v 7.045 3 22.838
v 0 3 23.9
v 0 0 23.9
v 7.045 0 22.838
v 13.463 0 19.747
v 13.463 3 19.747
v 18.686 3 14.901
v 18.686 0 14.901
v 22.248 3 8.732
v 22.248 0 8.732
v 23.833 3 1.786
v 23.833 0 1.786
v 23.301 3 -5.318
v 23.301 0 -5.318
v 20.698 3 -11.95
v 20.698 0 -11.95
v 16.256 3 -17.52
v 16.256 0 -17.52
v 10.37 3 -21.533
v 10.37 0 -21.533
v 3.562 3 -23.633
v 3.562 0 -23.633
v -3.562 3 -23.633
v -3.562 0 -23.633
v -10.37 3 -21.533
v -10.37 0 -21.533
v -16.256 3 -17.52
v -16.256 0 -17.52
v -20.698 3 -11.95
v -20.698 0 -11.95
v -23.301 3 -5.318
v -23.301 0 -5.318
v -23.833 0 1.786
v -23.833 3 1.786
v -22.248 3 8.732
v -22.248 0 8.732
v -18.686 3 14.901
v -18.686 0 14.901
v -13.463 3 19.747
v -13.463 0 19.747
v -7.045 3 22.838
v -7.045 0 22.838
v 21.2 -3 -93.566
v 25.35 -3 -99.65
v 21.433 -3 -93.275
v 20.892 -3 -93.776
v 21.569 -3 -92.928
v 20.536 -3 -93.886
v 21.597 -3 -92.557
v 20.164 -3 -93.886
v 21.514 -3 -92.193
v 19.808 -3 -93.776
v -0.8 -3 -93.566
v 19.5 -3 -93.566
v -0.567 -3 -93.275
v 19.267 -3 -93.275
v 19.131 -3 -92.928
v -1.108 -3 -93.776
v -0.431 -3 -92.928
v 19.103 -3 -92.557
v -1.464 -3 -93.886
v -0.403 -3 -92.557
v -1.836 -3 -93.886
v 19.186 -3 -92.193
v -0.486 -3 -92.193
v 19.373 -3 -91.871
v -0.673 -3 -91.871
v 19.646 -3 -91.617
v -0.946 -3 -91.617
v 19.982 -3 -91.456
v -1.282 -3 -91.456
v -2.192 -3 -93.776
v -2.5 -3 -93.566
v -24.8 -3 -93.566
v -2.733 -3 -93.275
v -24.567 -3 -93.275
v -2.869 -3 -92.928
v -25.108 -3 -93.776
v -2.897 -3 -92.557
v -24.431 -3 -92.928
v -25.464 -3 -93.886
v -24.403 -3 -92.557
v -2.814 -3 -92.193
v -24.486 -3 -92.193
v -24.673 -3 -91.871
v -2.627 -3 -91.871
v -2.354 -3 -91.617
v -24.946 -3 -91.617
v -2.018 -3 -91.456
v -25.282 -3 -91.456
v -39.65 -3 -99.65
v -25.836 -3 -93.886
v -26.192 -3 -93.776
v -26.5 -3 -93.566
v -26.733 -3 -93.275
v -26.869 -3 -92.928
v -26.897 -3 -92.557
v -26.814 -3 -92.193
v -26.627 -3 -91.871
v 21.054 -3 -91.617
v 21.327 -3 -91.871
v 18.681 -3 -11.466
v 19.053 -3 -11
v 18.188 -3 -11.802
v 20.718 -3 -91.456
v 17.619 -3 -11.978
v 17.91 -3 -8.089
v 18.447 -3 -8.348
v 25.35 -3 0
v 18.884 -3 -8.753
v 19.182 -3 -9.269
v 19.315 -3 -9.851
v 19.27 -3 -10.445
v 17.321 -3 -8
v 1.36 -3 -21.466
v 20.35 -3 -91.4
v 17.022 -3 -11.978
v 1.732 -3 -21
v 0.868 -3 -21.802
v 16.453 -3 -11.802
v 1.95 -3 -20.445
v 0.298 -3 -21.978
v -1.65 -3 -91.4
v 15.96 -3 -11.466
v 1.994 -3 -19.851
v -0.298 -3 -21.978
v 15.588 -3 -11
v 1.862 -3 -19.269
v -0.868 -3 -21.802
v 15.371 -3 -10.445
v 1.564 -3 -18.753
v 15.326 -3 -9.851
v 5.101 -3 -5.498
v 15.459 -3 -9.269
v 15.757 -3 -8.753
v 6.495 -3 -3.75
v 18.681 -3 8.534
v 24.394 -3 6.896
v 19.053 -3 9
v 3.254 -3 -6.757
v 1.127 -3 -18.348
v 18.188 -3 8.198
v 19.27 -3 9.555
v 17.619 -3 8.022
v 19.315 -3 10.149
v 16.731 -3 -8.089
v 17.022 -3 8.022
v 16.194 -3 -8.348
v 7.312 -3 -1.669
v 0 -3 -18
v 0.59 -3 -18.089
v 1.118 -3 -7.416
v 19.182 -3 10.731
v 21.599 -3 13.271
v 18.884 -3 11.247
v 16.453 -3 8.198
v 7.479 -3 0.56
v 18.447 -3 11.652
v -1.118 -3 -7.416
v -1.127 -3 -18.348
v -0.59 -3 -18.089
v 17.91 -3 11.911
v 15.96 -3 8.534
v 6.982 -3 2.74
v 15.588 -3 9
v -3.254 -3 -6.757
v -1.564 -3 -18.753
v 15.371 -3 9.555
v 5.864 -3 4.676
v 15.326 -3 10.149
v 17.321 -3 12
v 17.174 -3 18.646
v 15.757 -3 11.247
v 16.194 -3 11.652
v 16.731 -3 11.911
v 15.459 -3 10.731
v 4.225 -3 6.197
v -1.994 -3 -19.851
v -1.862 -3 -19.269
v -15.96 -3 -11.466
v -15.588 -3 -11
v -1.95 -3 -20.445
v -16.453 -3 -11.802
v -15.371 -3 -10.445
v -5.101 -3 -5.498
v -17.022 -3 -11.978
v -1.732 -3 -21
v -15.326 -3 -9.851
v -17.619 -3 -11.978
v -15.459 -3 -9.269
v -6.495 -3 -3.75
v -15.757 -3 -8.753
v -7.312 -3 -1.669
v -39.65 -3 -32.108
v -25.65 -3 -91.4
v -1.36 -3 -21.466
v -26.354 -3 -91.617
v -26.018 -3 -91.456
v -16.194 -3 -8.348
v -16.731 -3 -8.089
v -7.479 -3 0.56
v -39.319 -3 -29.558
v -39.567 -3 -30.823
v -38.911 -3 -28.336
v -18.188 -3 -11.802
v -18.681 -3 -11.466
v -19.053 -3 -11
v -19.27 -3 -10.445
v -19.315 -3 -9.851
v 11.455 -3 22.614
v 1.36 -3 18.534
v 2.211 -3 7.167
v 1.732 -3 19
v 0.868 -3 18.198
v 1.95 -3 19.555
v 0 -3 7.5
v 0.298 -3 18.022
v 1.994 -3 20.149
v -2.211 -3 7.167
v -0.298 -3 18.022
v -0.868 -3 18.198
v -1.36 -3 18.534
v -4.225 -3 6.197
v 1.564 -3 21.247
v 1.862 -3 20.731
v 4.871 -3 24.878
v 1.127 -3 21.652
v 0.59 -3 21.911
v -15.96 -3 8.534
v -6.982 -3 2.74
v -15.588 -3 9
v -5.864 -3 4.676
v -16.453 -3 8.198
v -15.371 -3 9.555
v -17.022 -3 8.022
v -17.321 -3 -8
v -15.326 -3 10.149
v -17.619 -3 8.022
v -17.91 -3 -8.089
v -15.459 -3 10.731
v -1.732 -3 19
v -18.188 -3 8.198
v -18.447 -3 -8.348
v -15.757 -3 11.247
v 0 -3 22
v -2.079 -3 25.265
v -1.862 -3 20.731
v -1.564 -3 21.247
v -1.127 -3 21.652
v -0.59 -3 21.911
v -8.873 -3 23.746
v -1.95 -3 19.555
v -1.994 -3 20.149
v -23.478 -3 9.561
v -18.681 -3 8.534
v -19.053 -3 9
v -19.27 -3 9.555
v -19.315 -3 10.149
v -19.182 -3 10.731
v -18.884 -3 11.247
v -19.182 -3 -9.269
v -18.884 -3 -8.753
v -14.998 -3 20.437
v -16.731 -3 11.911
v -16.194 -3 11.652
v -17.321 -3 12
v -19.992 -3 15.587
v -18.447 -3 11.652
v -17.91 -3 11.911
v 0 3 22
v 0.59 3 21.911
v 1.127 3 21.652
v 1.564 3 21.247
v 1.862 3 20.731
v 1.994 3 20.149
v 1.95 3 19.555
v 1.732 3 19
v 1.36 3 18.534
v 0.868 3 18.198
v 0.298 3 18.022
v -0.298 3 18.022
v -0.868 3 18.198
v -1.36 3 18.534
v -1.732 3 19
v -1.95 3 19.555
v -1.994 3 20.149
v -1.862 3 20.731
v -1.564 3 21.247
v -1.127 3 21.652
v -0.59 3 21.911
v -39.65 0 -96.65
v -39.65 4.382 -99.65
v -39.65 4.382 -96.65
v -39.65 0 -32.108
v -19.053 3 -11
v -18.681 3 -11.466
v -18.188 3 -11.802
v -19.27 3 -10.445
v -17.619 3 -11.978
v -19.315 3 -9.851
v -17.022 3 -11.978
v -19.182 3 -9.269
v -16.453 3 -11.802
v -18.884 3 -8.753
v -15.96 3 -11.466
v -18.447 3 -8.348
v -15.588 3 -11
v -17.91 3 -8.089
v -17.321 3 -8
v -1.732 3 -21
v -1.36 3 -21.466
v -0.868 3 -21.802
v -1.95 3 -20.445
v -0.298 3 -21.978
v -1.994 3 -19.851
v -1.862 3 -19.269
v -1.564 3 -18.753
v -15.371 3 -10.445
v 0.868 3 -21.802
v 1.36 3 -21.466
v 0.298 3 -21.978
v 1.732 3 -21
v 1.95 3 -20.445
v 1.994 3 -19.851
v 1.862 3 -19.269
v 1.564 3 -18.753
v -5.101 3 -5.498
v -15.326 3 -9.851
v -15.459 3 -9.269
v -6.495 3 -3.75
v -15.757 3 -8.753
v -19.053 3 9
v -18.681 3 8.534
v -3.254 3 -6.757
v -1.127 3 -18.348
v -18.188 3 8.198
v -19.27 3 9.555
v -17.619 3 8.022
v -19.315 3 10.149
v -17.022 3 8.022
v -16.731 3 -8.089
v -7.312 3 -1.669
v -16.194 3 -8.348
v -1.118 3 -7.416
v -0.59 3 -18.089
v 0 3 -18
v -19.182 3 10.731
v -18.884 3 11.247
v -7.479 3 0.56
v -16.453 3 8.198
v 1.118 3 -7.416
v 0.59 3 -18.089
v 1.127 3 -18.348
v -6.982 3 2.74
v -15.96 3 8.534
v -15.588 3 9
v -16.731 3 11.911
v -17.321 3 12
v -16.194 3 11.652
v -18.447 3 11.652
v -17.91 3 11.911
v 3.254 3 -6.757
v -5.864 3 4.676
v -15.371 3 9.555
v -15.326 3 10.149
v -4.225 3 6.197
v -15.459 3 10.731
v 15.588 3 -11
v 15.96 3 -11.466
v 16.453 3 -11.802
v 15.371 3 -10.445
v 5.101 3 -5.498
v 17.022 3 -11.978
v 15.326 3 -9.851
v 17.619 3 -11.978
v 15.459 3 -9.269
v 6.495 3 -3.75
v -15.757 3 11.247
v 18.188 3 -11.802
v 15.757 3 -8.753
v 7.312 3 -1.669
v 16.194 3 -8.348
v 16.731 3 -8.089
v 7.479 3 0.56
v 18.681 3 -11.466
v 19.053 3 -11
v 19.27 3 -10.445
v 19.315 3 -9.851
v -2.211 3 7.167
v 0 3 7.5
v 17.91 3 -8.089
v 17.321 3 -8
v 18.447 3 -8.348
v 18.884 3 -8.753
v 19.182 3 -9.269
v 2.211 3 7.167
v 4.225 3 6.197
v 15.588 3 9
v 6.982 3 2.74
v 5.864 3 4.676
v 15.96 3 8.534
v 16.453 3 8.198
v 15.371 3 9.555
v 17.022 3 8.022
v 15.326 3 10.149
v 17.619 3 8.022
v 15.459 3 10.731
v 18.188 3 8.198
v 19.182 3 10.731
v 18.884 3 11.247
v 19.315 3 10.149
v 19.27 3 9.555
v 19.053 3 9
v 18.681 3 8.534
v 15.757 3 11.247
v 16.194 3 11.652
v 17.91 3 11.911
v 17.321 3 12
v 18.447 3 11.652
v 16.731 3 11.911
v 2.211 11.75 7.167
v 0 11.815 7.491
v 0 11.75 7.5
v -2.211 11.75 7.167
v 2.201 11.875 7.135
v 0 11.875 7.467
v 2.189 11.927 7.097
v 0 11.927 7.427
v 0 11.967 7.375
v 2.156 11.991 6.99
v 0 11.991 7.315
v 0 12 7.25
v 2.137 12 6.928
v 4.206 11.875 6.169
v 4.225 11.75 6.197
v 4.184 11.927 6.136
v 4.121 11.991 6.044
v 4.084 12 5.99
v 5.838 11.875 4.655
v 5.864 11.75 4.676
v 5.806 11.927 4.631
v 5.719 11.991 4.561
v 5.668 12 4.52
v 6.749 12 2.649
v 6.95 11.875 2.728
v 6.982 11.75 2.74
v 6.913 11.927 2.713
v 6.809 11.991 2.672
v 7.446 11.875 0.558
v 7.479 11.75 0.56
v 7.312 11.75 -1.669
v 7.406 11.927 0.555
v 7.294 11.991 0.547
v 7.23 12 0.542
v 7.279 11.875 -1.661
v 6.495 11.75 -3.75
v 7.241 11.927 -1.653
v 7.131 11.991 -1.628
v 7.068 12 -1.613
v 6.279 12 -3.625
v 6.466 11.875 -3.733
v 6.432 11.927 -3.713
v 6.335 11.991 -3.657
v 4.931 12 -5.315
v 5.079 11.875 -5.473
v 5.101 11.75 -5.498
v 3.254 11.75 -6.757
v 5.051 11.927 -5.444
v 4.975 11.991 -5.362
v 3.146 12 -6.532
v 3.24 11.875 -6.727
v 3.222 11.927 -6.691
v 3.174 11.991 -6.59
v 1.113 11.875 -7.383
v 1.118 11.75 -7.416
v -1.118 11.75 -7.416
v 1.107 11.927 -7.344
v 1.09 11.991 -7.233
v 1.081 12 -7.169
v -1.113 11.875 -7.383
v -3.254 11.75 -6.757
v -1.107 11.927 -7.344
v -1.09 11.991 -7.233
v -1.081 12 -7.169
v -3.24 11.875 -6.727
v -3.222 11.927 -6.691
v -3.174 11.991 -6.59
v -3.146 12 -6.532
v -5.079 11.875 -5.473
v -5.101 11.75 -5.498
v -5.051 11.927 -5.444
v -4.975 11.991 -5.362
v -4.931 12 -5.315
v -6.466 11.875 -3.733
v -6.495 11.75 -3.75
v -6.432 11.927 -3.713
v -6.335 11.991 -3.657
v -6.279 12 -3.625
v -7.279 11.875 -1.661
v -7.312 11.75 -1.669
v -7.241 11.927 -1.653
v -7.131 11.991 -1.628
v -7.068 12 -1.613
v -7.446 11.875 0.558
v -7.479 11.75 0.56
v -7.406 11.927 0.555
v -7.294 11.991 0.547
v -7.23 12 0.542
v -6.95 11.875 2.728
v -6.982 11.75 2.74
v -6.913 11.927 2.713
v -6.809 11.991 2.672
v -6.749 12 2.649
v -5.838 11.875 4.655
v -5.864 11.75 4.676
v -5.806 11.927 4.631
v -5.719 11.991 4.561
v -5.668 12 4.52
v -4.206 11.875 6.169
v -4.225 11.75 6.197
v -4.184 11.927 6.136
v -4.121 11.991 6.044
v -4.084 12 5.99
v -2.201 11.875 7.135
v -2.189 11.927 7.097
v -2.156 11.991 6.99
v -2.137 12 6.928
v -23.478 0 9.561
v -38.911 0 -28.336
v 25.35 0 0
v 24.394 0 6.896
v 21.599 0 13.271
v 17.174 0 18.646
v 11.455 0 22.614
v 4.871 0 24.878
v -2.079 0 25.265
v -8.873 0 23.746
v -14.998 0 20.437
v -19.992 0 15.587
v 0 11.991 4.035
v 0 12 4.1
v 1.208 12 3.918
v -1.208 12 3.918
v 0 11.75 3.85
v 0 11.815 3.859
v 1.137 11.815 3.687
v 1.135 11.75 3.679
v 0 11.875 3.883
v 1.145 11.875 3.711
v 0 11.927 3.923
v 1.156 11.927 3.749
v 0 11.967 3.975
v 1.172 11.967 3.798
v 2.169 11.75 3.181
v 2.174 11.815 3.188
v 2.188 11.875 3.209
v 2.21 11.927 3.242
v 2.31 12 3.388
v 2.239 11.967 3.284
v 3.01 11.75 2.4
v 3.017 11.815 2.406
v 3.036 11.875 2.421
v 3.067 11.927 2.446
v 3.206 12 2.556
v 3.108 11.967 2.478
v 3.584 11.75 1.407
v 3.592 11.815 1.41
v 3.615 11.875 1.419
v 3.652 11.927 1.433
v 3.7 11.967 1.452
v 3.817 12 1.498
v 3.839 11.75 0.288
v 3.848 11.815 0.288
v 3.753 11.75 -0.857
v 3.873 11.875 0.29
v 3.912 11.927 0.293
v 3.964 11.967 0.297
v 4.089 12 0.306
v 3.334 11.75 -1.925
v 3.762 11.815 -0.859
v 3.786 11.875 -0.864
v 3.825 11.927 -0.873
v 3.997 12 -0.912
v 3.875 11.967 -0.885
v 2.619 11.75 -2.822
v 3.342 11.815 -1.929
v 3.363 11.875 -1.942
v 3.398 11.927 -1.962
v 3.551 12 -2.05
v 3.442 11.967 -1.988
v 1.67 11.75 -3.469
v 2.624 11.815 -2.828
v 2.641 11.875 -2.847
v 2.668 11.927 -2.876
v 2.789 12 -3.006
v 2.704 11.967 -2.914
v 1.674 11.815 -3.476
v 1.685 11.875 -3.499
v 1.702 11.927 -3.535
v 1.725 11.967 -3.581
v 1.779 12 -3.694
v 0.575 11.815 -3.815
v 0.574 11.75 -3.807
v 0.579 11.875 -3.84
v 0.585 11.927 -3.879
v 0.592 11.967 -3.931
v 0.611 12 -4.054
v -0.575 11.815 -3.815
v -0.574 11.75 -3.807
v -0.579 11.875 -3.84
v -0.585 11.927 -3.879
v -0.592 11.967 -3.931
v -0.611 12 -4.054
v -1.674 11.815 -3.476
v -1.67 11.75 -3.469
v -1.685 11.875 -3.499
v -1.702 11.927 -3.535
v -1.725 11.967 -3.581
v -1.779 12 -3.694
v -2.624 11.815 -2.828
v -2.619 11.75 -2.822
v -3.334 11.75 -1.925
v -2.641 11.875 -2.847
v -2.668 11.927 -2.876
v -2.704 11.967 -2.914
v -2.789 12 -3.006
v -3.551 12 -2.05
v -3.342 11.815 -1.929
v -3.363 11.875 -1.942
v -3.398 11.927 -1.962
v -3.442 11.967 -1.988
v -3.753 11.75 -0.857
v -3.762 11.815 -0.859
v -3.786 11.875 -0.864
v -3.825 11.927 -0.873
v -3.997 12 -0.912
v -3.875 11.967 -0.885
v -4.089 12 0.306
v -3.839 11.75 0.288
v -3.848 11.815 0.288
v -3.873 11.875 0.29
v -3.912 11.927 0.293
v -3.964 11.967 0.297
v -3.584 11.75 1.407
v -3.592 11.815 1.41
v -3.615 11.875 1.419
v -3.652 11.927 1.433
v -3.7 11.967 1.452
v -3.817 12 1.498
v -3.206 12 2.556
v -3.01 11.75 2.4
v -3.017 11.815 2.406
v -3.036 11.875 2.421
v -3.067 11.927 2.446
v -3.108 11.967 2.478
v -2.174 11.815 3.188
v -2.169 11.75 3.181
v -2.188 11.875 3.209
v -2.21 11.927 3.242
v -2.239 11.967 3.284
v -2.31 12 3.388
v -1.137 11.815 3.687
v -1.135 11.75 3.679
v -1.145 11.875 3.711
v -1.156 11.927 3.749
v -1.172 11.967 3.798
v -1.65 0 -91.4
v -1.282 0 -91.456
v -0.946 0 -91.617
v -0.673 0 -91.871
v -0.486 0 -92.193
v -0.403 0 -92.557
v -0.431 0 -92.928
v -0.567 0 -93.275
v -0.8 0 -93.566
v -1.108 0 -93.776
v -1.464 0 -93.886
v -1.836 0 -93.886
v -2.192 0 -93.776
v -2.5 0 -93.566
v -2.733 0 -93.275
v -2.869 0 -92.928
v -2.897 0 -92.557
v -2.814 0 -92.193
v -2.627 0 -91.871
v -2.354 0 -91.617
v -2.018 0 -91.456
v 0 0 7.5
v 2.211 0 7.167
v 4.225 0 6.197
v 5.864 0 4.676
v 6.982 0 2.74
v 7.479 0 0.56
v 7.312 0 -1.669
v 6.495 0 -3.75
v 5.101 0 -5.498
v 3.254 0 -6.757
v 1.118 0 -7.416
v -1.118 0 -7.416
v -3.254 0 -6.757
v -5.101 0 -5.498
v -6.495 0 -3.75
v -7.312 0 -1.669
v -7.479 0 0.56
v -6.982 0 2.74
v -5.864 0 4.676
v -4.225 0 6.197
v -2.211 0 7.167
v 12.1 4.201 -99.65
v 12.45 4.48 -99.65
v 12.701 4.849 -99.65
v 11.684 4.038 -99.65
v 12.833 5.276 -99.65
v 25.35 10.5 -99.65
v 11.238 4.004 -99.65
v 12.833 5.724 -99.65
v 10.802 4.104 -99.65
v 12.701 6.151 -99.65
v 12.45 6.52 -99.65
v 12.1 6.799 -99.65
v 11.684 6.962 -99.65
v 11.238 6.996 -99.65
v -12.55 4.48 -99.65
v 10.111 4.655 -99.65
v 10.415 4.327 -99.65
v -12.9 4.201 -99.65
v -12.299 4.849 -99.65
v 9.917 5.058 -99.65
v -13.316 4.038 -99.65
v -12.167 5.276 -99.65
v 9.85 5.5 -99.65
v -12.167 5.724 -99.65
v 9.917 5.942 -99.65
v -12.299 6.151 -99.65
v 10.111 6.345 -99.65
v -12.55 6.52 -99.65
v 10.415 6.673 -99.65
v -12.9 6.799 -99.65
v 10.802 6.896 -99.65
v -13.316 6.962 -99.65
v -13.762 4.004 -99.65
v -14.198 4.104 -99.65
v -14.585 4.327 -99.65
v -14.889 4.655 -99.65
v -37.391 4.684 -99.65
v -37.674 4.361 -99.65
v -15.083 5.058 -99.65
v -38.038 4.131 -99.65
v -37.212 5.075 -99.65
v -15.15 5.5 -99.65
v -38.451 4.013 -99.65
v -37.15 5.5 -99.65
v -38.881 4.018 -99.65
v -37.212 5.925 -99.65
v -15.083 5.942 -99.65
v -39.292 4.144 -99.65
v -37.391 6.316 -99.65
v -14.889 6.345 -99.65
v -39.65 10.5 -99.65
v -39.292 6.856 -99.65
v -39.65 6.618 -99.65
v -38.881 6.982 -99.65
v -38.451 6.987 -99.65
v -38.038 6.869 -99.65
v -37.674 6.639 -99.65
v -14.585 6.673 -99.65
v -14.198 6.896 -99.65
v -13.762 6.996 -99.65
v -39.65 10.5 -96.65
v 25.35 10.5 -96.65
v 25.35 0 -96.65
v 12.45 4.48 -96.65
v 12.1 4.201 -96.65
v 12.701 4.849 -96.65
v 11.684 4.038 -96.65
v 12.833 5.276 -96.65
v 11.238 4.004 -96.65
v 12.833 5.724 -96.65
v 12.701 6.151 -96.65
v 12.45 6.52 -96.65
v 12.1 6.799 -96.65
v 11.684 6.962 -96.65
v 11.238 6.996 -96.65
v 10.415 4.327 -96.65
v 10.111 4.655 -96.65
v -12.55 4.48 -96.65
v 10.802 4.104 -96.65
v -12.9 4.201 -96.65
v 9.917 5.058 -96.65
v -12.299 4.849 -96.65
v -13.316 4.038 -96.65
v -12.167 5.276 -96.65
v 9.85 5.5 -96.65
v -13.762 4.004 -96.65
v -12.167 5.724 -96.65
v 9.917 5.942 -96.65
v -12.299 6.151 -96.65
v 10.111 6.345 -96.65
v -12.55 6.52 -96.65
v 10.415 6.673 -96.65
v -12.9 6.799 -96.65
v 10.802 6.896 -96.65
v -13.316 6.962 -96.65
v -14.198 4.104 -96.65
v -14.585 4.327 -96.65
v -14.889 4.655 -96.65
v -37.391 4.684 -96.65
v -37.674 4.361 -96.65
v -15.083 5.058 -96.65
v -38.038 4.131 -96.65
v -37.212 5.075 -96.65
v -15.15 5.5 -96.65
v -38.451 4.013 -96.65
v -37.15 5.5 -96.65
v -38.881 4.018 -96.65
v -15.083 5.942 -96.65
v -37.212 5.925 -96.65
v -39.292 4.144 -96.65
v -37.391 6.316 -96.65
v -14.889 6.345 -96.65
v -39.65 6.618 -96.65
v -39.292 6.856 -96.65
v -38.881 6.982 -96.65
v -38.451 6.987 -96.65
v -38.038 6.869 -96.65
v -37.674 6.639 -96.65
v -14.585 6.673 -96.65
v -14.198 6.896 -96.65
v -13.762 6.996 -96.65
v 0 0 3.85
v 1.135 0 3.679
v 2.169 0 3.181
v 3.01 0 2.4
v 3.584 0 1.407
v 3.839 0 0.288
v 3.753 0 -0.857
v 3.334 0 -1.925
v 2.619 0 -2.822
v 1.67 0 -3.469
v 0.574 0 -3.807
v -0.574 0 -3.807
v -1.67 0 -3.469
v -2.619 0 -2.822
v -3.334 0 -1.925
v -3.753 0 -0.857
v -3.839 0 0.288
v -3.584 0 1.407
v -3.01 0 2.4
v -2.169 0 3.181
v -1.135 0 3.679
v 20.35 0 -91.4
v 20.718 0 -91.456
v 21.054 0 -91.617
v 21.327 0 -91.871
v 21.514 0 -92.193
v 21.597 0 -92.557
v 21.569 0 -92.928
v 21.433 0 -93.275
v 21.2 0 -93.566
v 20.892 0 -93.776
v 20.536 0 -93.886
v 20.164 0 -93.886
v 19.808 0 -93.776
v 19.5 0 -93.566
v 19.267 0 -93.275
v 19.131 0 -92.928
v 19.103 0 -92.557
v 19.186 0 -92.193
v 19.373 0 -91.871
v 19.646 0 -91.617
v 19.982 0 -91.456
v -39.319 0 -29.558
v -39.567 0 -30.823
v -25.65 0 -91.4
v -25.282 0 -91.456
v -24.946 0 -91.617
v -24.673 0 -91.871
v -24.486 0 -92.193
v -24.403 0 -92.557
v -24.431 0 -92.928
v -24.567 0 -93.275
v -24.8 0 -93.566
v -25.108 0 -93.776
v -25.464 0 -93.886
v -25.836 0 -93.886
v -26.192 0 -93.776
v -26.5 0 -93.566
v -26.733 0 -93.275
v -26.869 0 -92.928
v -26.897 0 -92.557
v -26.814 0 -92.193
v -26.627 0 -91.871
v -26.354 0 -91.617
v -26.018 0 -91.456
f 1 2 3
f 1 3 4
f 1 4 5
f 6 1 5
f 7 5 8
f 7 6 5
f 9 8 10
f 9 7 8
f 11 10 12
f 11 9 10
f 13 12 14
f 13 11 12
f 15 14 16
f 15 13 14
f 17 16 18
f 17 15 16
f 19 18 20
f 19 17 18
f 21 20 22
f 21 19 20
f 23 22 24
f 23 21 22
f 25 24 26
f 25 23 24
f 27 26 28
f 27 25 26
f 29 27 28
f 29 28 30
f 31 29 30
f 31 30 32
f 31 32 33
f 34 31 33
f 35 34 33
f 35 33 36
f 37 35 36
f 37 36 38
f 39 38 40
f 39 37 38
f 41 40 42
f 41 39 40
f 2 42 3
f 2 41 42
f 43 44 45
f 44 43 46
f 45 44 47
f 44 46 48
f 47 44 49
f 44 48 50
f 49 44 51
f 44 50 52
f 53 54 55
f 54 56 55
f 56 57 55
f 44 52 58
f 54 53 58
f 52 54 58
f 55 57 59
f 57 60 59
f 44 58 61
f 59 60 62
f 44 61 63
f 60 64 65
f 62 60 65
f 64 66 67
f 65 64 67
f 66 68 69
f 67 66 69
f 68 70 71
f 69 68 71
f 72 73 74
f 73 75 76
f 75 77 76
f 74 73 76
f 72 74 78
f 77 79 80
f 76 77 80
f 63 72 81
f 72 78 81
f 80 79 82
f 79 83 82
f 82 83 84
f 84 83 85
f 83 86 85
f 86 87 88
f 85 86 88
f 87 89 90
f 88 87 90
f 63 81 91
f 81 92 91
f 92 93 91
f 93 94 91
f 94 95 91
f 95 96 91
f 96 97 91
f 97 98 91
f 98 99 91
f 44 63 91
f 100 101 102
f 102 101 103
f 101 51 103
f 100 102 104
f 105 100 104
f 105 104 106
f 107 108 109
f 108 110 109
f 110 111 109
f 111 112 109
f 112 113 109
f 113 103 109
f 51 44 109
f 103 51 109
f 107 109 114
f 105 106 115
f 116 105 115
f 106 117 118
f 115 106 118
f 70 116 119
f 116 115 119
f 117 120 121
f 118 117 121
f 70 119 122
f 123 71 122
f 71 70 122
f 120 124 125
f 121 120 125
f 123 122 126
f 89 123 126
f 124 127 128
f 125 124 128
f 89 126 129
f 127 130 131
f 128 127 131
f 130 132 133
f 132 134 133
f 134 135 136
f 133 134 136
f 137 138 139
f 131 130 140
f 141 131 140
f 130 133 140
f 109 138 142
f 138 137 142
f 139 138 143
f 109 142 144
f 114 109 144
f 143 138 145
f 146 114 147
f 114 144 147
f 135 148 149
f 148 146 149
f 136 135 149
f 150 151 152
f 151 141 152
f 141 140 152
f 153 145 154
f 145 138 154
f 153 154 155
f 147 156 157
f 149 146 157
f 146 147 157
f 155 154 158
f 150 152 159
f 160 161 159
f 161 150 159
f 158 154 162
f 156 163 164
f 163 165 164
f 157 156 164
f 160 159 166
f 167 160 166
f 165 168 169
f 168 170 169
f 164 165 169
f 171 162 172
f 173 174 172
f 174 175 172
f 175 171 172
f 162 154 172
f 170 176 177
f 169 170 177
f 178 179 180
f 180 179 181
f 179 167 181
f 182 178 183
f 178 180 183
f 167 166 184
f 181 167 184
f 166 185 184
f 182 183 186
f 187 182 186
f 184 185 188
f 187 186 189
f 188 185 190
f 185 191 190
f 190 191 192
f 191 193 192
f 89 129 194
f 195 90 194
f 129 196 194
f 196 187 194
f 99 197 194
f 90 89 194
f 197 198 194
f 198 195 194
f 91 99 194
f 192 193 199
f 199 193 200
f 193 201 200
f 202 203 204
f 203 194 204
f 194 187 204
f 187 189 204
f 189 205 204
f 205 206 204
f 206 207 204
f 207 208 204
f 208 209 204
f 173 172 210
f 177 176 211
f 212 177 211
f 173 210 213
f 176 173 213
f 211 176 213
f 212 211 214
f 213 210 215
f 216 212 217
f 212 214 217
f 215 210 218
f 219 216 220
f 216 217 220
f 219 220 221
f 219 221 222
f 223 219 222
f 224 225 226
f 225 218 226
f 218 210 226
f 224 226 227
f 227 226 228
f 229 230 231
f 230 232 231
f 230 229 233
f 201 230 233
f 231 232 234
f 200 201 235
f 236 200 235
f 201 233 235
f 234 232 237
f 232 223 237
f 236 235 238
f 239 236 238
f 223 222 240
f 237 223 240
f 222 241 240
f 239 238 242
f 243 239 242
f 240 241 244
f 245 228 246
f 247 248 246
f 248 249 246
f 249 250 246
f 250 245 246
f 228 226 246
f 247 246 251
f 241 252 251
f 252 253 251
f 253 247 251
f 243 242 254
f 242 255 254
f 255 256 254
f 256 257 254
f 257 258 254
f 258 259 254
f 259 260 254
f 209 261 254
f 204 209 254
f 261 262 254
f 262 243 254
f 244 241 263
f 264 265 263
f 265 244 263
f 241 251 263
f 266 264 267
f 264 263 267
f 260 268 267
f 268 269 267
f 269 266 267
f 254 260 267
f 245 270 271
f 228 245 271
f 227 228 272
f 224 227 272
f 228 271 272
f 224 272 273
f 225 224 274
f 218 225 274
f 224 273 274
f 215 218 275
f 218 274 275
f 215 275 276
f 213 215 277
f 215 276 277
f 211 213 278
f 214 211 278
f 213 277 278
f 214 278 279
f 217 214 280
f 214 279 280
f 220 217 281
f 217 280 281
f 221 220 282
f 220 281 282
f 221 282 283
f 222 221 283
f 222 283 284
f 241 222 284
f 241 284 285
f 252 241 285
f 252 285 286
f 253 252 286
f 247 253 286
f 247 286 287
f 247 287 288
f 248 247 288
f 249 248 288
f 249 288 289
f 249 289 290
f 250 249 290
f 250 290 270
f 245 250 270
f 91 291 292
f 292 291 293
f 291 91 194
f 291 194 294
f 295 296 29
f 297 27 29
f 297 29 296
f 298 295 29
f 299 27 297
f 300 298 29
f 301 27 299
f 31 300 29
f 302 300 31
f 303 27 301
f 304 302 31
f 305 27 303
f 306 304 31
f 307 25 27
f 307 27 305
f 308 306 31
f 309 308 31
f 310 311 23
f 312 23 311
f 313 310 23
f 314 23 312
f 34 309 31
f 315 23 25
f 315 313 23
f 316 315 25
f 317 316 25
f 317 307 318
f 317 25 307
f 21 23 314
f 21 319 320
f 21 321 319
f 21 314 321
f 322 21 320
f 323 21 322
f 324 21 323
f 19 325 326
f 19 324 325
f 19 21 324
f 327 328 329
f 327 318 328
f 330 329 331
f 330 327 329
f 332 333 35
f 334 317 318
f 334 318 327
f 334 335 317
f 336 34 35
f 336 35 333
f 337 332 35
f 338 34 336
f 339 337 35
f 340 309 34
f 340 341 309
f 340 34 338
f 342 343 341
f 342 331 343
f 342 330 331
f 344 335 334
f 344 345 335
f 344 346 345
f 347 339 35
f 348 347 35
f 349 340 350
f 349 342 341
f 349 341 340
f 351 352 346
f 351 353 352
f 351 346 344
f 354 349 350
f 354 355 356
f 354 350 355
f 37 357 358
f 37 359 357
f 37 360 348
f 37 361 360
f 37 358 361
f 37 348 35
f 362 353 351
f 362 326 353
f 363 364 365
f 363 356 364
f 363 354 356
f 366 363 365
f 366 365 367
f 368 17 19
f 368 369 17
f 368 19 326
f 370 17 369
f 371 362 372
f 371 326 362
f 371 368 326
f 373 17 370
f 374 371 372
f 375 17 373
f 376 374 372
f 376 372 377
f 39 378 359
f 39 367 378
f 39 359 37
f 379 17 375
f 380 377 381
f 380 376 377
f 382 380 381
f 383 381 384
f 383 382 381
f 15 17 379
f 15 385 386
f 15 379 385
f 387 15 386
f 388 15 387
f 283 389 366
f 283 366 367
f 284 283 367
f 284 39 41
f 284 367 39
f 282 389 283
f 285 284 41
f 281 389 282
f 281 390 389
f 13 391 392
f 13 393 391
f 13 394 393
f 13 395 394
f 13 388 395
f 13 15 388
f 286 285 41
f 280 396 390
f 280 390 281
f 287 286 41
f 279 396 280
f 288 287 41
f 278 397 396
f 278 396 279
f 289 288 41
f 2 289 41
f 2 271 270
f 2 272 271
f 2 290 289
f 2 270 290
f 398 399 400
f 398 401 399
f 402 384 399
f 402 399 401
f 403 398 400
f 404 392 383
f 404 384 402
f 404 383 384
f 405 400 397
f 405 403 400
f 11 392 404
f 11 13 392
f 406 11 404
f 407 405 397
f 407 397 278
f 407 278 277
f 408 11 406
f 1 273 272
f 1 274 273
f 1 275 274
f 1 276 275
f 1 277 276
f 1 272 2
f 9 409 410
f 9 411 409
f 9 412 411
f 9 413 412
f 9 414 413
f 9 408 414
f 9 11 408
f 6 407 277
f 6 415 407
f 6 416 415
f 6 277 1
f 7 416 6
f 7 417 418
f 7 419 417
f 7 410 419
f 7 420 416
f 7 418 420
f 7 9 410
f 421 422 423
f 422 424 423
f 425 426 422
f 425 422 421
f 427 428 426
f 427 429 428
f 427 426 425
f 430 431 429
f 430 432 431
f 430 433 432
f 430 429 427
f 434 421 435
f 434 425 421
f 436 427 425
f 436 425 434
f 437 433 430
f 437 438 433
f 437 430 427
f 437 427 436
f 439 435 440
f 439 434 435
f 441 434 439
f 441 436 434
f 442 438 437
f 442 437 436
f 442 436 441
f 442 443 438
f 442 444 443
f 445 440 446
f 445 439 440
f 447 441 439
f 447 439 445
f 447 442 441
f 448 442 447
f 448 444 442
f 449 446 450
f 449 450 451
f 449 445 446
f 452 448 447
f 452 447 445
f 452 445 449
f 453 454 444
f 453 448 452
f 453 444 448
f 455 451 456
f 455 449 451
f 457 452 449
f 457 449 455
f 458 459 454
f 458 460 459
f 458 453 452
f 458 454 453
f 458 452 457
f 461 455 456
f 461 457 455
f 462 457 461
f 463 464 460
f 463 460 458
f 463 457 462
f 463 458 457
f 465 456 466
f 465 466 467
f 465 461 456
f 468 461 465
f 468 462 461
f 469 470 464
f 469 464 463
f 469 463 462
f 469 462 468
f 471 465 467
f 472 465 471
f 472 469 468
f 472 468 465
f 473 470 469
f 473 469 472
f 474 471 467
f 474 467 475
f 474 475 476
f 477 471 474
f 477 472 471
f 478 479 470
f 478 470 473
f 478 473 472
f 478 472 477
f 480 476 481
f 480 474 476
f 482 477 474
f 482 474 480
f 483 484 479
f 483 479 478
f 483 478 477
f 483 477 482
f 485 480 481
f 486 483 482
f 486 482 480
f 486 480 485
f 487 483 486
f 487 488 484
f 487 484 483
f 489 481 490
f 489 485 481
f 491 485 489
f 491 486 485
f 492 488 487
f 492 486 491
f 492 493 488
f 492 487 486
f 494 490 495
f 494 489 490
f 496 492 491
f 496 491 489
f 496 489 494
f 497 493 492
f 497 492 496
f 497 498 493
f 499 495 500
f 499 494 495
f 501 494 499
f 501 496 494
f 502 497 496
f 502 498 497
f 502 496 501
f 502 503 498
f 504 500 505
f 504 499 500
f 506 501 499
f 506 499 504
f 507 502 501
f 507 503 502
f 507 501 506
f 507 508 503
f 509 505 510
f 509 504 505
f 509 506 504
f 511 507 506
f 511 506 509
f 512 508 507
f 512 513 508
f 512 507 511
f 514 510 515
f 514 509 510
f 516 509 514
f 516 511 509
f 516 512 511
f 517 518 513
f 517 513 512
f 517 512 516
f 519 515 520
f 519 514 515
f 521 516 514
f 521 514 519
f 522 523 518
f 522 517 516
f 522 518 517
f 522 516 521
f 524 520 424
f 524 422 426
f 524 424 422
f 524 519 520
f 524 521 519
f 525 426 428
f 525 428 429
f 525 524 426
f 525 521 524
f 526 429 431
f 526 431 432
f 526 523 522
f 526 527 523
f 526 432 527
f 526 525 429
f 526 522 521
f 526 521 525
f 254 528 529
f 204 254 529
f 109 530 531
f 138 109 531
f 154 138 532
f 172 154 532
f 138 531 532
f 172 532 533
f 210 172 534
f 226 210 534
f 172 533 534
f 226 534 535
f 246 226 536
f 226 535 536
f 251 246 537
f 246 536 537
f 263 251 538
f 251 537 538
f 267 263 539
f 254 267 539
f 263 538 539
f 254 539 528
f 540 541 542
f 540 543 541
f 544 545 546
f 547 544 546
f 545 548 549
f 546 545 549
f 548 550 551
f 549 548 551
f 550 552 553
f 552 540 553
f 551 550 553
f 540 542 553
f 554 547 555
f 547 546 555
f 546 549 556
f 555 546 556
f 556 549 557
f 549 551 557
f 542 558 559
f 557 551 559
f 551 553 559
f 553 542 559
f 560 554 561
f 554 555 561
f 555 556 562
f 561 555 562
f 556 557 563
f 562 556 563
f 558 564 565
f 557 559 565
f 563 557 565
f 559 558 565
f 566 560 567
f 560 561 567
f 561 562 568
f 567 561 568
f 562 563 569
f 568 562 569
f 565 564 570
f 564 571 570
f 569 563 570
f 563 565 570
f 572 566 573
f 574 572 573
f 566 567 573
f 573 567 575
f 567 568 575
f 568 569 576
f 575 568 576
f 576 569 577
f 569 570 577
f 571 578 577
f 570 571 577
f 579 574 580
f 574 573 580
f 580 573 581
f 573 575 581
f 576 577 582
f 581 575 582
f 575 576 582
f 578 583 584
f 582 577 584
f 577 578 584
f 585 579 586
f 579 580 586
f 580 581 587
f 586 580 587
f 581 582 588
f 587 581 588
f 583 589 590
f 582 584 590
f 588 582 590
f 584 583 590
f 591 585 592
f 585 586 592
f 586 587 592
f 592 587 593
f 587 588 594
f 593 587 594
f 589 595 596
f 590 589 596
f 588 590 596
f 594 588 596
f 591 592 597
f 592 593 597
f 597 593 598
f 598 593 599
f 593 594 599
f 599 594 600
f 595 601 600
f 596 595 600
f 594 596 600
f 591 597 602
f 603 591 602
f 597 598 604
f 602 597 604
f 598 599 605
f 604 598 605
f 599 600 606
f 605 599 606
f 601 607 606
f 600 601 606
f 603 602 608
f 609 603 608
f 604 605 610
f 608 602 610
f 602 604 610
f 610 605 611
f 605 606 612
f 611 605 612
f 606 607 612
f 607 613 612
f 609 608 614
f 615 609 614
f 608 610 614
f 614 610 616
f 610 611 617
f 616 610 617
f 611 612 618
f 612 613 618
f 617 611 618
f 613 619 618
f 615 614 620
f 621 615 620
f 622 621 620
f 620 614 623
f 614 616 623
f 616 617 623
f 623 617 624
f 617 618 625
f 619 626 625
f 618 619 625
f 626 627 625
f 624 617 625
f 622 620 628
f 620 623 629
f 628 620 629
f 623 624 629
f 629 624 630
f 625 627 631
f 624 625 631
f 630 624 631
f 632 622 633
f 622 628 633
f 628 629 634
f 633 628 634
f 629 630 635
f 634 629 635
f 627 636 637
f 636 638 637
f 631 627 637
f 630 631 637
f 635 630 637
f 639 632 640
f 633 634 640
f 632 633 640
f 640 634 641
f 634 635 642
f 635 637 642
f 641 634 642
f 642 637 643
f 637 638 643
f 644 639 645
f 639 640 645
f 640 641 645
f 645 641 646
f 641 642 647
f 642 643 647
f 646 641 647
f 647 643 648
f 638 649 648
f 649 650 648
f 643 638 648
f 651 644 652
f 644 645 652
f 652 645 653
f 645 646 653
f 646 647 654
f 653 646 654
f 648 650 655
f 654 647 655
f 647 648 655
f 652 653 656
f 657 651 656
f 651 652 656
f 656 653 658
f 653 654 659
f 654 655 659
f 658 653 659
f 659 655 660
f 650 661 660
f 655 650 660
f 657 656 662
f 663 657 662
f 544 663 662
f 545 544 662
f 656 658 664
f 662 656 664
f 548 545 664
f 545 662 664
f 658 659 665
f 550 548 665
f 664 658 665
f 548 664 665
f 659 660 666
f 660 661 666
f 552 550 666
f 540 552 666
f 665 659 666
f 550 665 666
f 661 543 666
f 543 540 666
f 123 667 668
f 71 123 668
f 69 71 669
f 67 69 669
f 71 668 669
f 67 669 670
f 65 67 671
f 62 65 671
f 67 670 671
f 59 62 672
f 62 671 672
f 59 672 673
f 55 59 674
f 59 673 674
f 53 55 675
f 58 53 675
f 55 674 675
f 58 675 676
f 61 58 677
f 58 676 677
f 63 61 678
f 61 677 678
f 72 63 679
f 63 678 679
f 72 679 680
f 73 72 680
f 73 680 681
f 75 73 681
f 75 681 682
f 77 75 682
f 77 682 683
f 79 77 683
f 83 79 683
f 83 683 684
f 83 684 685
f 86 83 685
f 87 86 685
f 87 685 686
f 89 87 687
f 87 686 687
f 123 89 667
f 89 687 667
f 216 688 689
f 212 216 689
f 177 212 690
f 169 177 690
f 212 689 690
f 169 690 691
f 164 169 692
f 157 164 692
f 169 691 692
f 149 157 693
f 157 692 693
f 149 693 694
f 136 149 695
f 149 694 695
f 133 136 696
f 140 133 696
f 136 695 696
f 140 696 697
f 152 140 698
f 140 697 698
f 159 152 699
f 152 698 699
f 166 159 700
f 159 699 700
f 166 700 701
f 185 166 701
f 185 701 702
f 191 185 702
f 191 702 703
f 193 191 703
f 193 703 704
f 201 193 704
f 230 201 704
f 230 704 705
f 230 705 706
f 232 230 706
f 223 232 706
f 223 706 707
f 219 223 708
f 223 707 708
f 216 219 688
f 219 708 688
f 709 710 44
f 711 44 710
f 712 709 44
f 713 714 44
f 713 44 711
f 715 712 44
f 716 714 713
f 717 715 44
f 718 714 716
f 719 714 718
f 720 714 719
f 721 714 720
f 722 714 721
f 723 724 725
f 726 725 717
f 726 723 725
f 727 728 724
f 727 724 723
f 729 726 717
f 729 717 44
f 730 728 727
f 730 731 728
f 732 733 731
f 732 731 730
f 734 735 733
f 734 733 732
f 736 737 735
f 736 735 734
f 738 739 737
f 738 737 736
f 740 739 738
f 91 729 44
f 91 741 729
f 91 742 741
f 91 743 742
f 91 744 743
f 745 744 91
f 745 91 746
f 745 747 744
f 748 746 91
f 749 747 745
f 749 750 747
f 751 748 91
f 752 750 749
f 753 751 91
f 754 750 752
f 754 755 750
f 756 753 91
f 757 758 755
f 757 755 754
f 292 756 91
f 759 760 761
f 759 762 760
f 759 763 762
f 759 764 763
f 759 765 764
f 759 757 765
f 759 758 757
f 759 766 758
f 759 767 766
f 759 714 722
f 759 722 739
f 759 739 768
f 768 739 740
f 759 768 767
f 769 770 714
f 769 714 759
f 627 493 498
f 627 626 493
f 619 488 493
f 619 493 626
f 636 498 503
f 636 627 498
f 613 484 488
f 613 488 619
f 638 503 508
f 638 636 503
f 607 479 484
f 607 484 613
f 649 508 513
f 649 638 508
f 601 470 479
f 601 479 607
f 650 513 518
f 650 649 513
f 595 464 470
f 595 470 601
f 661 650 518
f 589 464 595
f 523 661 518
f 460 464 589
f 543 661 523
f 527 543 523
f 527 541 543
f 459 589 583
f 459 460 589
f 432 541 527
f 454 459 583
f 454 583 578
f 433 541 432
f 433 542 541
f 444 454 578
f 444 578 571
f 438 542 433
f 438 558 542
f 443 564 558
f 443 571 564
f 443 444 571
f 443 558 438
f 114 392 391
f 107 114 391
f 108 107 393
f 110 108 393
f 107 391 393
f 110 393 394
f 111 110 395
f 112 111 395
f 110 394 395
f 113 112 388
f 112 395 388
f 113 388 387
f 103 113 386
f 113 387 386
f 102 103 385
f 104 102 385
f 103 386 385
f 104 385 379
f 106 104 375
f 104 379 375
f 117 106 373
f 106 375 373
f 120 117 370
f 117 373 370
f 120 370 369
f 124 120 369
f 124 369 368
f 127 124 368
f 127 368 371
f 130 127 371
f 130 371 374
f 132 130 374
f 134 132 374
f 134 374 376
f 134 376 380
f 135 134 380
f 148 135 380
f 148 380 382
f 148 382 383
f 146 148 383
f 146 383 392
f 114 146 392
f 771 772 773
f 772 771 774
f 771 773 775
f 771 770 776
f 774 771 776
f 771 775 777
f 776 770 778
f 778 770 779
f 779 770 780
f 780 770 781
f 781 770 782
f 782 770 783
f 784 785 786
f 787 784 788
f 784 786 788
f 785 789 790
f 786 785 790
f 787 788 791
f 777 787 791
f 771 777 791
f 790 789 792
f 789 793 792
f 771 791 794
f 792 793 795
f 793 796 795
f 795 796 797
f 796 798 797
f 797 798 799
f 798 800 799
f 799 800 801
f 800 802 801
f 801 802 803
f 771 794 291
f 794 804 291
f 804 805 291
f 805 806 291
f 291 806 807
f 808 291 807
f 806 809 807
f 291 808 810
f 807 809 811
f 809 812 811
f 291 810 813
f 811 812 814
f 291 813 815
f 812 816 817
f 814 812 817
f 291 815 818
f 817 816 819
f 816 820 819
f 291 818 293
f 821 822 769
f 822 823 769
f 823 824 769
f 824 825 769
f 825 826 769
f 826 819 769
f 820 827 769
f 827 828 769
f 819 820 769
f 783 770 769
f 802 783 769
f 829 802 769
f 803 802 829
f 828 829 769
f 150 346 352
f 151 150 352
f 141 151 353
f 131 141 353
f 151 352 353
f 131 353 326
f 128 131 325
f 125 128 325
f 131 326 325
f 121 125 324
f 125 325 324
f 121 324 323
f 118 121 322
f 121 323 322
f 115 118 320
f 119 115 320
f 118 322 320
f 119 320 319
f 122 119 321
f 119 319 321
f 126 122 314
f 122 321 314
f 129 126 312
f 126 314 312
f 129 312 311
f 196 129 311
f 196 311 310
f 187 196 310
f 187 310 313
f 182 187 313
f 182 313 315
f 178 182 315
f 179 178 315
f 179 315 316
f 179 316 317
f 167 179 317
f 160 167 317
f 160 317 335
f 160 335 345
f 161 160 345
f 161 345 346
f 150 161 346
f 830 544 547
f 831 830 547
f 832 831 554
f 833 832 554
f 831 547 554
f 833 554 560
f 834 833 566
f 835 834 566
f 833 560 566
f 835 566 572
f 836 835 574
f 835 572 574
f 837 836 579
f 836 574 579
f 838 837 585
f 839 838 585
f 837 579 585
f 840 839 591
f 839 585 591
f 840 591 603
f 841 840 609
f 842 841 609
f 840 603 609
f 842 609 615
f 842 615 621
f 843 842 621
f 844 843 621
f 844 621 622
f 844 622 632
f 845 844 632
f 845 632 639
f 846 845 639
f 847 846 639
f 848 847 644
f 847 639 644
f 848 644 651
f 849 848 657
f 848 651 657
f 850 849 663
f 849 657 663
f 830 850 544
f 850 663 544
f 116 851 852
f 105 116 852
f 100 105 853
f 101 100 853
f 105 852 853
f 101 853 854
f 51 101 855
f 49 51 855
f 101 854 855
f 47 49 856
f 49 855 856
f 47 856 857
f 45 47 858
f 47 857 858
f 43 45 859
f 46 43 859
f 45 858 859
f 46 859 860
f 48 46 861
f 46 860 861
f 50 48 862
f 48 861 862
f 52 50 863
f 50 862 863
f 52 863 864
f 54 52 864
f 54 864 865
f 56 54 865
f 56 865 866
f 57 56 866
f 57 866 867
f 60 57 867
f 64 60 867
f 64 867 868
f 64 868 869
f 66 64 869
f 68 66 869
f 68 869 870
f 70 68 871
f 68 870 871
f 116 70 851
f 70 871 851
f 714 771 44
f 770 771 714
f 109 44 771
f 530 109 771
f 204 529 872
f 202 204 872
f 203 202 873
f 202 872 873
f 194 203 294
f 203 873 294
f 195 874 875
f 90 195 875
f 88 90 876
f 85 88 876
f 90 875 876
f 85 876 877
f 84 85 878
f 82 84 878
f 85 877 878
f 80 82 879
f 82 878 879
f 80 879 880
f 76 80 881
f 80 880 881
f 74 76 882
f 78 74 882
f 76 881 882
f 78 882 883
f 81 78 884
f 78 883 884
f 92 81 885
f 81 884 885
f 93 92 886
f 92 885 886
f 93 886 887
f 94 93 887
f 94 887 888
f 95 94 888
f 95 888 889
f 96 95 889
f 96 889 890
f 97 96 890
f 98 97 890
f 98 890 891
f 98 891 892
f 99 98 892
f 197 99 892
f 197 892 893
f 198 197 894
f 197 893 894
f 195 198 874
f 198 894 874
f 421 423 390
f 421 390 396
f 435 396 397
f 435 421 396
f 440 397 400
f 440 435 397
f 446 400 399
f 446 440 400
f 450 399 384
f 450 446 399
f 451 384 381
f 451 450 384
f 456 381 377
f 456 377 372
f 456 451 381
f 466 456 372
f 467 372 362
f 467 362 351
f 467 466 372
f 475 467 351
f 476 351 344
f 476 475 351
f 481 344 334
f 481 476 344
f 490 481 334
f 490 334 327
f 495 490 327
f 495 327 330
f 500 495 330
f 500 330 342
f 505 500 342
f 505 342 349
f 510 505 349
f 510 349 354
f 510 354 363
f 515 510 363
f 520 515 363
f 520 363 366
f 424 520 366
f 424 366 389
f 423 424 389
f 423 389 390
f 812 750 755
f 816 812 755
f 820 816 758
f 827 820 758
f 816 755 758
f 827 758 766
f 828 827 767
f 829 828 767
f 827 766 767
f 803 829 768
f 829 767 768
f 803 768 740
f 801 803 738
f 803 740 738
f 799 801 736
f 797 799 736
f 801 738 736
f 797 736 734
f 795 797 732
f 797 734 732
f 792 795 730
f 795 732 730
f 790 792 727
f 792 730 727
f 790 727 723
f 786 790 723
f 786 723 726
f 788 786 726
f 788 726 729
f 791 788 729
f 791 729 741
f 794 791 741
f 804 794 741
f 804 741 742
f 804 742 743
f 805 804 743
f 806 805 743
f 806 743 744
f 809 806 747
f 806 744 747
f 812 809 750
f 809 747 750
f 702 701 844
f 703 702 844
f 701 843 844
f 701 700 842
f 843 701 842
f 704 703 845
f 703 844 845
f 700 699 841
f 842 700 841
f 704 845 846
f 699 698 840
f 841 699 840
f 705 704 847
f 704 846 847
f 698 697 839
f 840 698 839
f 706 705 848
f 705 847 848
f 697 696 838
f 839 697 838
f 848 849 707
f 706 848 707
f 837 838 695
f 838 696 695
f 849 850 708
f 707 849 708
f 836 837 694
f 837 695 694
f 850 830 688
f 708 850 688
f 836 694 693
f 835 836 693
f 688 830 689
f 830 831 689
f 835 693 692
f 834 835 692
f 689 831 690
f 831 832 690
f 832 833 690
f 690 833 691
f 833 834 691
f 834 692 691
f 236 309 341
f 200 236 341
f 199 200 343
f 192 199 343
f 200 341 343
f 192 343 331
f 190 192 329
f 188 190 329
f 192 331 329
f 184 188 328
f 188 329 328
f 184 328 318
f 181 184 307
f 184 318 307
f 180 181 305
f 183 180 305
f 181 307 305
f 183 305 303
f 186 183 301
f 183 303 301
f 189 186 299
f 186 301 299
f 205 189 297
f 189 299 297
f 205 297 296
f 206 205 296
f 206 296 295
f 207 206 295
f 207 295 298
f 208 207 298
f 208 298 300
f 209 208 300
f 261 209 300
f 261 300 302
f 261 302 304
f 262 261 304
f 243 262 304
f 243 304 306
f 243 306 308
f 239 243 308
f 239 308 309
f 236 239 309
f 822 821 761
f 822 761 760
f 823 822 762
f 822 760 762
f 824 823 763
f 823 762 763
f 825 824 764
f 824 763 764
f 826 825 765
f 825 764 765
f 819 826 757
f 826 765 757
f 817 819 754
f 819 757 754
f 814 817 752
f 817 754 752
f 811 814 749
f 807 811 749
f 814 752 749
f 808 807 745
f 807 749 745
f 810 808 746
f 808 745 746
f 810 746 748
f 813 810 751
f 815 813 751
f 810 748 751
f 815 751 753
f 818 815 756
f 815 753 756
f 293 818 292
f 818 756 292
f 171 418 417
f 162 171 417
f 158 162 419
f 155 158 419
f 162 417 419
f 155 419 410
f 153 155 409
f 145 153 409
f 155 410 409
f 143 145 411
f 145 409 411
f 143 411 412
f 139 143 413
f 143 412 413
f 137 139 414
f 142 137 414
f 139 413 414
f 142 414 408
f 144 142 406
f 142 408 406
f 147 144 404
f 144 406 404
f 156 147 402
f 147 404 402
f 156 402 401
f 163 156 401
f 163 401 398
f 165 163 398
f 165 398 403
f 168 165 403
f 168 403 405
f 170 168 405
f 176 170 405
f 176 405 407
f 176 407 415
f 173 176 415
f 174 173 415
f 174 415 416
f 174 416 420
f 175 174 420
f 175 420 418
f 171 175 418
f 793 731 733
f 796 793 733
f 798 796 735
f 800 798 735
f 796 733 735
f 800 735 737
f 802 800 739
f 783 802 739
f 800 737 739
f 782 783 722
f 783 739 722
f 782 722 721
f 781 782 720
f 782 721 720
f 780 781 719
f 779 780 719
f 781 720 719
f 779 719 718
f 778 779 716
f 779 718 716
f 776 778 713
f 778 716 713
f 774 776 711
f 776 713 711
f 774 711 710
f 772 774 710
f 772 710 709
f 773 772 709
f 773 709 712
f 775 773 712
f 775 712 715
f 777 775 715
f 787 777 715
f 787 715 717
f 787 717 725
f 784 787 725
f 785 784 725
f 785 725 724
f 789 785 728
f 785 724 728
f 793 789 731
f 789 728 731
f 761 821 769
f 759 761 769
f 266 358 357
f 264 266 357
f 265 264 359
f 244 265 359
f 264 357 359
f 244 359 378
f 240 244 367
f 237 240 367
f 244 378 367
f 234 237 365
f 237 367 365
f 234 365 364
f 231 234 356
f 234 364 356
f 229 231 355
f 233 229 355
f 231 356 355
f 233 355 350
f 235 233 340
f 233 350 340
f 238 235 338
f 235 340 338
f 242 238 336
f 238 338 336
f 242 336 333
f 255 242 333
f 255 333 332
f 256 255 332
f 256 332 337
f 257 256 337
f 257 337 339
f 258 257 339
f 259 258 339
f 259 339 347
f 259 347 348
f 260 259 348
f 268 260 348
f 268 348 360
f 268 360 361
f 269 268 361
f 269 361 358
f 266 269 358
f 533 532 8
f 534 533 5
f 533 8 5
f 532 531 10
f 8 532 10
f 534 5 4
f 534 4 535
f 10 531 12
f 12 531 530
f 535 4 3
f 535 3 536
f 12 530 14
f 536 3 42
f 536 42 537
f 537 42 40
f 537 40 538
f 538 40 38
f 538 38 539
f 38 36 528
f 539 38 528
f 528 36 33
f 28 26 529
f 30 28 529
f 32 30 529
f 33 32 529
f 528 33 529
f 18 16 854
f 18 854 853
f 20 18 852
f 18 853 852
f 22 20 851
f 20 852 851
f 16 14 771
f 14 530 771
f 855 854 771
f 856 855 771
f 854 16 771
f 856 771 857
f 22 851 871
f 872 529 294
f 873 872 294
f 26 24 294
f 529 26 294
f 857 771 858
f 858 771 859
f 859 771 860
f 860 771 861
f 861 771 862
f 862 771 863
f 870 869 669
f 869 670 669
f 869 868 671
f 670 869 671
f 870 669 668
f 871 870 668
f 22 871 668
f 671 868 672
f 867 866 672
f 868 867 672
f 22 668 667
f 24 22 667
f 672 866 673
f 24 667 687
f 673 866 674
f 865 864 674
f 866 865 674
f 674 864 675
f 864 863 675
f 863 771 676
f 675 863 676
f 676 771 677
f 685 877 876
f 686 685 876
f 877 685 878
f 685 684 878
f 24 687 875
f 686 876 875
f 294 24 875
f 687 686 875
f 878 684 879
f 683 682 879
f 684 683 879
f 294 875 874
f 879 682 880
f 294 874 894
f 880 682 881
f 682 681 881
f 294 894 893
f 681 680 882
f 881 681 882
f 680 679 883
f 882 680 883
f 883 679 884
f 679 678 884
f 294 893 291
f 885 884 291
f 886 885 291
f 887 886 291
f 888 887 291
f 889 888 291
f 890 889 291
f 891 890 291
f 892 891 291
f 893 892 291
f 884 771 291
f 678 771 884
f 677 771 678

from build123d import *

# Parameters (mm, degrees)
ESBO_O1_R                = 7.5
ESBO_O1_R_2              = 2
ESBO_O1_R_3              = 1.25
RESSALTO_EXTRUS_O1_DEPTH = 3
RESSALTO_EXTRUS_O2_START = 3
ESBO_O1_3_R              = 23.9
ESBO_O1_3_R_2            = 2
ESBO_O1_3_R_3            = 3.85
RESSALTO_EXTRUS_O2_DEPTH = 3
RESSALTO_EXTRUS_O3_START = 12
ESBO_O1_4_R              = 7.5
ESBO_O1_4_R_2            = 3.85
RESSALTO_EXTRUS_O3_DEPTH = 12
FILETE1_R                = 0.25
ESBO_O2_W                = 65
ESBO_O2_H                = 13.5
RESSALTO_EXTRUS_O4_DEPTH = 3
ESBO_O4_R                = 1.5
CORTE_EXTRUS_O1_DEPTH    = 3


with BuildPart() as part:
    # Esboço1 → Ressalto-extrusão1 (new body)
    with BuildSketch(Plane(origin=(0, 0, 0), x_dir=(1, 0, 0), z_dir=(0, 1, 0))):
        with BuildLine():
            Line((-39.65, 96.65), (25.35, 96.65))
            Line((25.35, 96.65), (25.35, 0))
            ThreePointArc((25.35, 0), (4.871403095, -24.877538702), (-23.477765829, -9.561224382))
            Line((-23.477765829, -9.561224382), (-38.911446086, 28.336467011))
            ThreePointArc((-38.911446086, 28.336467011), (-39.463624735, 30.186495131), (-39.65, 32.108153157))
            Line((-39.65, 32.108153157), (-39.65, 96.65))
        make_face()
        with Locations(Location((0, 0, 0), (0, 0, 270))):
            Circle(ESBO_O1_R, mode=Mode.SUBTRACT)
        with Locations(Location((0, 20, 0), (0, 0, 270))):
            Circle(ESBO_O1_R_2, mode=Mode.SUBTRACT)
        with Locations(Location((17.320508076, 10, 0), (0, 0, 270))):
            Circle(ESBO_O1_R_2, mode=Mode.SUBTRACT)
        with Locations(Location((17.320508076, -10, 0), (0, 0, 270))):
            Circle(ESBO_O1_R_2, mode=Mode.SUBTRACT)
        with Locations(Location((0, -20, 0), (0, 0, 270))):
            Circle(ESBO_O1_R_2, mode=Mode.SUBTRACT)
        with Locations(Location((-17.320508076, -10, 0), (0, 0, 270))):
            Circle(ESBO_O1_R_2, mode=Mode.SUBTRACT)
        with Locations(Location((-17.320508076, 10, 0), (0, 0, 270))):
            Circle(ESBO_O1_R_2, mode=Mode.SUBTRACT)
        with Locations(Location((20.35, 92.65, 0), (0, 0, 270))):
            Circle(ESBO_O1_R_3, mode=Mode.SUBTRACT)
        with Locations(Location((-1.65, 92.65, 0), (0, 0, 270))):
            Circle(ESBO_O1_R_3, mode=Mode.SUBTRACT)
        with Locations(Location((-25.65, 92.65, 0), (0, 0, 270))):
            Circle(ESBO_O1_R_3, mode=Mode.SUBTRACT)
    extrude(amount=-RESSALTO_EXTRUS_O1_DEPTH)

    # Esboço1<3> → Ressalto-extrusão2 (add)
    with BuildSketch(Plane(origin=(0, 0, 0), x_dir=(1, 0, 0), z_dir=(0, 1, 0)).offset(RESSALTO_EXTRUS_O2_START)):
        with Locations(Location((0, 0, 0), (0, 0, 270))):
            Circle(ESBO_O1_3_R)
        with Locations(Location((-17.320508076, -10, 0), (0, 0, 270))):
            Circle(ESBO_O1_3_R_2, mode=Mode.SUBTRACT)
        with Locations(Location((-17.320508076, 10, 0), (0, 0, 270))):
            Circle(ESBO_O1_3_R_2, mode=Mode.SUBTRACT)
        with Locations(Location((0, -20, 0), (0, 0, 270))):
            Circle(ESBO_O1_3_R_2, mode=Mode.SUBTRACT)
        with Locations(Location((17.320508076, -10, 0), (0, 0, 270))):
            Circle(ESBO_O1_3_R_2, mode=Mode.SUBTRACT)
        with Locations(Location((0, 20, 0), (0, 0, 270))):
            Circle(ESBO_O1_3_R_2, mode=Mode.SUBTRACT)
        with Locations(Location((17.320508076, 10, 0), (0, 0, 270))):
            Circle(ESBO_O1_3_R_2, mode=Mode.SUBTRACT)
        with Locations(Location((0, 0, 0), (0, 0, 270))):
            Circle(ESBO_O1_3_R_3, mode=Mode.SUBTRACT)
    extrude(amount=-RESSALTO_EXTRUS_O2_DEPTH)

    # Esboço1<4> → Ressalto-extrusão3 (add)
    with BuildSketch(Plane(origin=(0, 0, 0), x_dir=(1, 0, 0), z_dir=(0, 1, 0)).offset(RESSALTO_EXTRUS_O3_START)):
        with Locations(Location((0, 0, 0), (0, 0, 270))):
            Circle(ESBO_O1_4_R)
        with Locations(Location((0, 0, 0), (0, 0, 270))):
            Circle(ESBO_O1_4_R_2, mode=Mode.SUBTRACT)
    extrude(amount=-RESSALTO_EXTRUS_O3_DEPTH)

    # Filete1
    filete1_edges = [part.edges().sort_by_distance(p)[0] for p in [
        (0, 12, -3.85),
        (0, 12, -7.5),
    ]]
    fillet(filete1_edges, radius=FILETE1_R)

    # Esboço2 → Ressalto-extrusão4 (add)
    with BuildSketch(Plane(origin=(0, 0, -96.65), x_dir=(-1, 0, 0), z_dir=(0, 0, -1))):
        with Locations((7.15, 3.75)):
            Rectangle(ESBO_O2_W, ESBO_O2_H)
    extrude(amount=RESSALTO_EXTRUS_O4_DEPTH)

    # Esboço4 → Corte-extrusão1 (cut)
    with BuildSketch(Plane(origin=(0, 0, -99.65), x_dir=(-1, 0, 0), z_dir=(0, 0, -1))):
        with Locations((-11.35, 5.5)):
            Circle(ESBO_O4_R)
        with Locations((13.65, 5.5)):
            Circle(ESBO_O4_R)
        with Locations((38.65, 5.5)):
            Circle(ESBO_O4_R)
    extrude(amount=-CORTE_EXTRUS_O1_DEPTH, mode=Mode.SUBTRACT)


solid = part.part
